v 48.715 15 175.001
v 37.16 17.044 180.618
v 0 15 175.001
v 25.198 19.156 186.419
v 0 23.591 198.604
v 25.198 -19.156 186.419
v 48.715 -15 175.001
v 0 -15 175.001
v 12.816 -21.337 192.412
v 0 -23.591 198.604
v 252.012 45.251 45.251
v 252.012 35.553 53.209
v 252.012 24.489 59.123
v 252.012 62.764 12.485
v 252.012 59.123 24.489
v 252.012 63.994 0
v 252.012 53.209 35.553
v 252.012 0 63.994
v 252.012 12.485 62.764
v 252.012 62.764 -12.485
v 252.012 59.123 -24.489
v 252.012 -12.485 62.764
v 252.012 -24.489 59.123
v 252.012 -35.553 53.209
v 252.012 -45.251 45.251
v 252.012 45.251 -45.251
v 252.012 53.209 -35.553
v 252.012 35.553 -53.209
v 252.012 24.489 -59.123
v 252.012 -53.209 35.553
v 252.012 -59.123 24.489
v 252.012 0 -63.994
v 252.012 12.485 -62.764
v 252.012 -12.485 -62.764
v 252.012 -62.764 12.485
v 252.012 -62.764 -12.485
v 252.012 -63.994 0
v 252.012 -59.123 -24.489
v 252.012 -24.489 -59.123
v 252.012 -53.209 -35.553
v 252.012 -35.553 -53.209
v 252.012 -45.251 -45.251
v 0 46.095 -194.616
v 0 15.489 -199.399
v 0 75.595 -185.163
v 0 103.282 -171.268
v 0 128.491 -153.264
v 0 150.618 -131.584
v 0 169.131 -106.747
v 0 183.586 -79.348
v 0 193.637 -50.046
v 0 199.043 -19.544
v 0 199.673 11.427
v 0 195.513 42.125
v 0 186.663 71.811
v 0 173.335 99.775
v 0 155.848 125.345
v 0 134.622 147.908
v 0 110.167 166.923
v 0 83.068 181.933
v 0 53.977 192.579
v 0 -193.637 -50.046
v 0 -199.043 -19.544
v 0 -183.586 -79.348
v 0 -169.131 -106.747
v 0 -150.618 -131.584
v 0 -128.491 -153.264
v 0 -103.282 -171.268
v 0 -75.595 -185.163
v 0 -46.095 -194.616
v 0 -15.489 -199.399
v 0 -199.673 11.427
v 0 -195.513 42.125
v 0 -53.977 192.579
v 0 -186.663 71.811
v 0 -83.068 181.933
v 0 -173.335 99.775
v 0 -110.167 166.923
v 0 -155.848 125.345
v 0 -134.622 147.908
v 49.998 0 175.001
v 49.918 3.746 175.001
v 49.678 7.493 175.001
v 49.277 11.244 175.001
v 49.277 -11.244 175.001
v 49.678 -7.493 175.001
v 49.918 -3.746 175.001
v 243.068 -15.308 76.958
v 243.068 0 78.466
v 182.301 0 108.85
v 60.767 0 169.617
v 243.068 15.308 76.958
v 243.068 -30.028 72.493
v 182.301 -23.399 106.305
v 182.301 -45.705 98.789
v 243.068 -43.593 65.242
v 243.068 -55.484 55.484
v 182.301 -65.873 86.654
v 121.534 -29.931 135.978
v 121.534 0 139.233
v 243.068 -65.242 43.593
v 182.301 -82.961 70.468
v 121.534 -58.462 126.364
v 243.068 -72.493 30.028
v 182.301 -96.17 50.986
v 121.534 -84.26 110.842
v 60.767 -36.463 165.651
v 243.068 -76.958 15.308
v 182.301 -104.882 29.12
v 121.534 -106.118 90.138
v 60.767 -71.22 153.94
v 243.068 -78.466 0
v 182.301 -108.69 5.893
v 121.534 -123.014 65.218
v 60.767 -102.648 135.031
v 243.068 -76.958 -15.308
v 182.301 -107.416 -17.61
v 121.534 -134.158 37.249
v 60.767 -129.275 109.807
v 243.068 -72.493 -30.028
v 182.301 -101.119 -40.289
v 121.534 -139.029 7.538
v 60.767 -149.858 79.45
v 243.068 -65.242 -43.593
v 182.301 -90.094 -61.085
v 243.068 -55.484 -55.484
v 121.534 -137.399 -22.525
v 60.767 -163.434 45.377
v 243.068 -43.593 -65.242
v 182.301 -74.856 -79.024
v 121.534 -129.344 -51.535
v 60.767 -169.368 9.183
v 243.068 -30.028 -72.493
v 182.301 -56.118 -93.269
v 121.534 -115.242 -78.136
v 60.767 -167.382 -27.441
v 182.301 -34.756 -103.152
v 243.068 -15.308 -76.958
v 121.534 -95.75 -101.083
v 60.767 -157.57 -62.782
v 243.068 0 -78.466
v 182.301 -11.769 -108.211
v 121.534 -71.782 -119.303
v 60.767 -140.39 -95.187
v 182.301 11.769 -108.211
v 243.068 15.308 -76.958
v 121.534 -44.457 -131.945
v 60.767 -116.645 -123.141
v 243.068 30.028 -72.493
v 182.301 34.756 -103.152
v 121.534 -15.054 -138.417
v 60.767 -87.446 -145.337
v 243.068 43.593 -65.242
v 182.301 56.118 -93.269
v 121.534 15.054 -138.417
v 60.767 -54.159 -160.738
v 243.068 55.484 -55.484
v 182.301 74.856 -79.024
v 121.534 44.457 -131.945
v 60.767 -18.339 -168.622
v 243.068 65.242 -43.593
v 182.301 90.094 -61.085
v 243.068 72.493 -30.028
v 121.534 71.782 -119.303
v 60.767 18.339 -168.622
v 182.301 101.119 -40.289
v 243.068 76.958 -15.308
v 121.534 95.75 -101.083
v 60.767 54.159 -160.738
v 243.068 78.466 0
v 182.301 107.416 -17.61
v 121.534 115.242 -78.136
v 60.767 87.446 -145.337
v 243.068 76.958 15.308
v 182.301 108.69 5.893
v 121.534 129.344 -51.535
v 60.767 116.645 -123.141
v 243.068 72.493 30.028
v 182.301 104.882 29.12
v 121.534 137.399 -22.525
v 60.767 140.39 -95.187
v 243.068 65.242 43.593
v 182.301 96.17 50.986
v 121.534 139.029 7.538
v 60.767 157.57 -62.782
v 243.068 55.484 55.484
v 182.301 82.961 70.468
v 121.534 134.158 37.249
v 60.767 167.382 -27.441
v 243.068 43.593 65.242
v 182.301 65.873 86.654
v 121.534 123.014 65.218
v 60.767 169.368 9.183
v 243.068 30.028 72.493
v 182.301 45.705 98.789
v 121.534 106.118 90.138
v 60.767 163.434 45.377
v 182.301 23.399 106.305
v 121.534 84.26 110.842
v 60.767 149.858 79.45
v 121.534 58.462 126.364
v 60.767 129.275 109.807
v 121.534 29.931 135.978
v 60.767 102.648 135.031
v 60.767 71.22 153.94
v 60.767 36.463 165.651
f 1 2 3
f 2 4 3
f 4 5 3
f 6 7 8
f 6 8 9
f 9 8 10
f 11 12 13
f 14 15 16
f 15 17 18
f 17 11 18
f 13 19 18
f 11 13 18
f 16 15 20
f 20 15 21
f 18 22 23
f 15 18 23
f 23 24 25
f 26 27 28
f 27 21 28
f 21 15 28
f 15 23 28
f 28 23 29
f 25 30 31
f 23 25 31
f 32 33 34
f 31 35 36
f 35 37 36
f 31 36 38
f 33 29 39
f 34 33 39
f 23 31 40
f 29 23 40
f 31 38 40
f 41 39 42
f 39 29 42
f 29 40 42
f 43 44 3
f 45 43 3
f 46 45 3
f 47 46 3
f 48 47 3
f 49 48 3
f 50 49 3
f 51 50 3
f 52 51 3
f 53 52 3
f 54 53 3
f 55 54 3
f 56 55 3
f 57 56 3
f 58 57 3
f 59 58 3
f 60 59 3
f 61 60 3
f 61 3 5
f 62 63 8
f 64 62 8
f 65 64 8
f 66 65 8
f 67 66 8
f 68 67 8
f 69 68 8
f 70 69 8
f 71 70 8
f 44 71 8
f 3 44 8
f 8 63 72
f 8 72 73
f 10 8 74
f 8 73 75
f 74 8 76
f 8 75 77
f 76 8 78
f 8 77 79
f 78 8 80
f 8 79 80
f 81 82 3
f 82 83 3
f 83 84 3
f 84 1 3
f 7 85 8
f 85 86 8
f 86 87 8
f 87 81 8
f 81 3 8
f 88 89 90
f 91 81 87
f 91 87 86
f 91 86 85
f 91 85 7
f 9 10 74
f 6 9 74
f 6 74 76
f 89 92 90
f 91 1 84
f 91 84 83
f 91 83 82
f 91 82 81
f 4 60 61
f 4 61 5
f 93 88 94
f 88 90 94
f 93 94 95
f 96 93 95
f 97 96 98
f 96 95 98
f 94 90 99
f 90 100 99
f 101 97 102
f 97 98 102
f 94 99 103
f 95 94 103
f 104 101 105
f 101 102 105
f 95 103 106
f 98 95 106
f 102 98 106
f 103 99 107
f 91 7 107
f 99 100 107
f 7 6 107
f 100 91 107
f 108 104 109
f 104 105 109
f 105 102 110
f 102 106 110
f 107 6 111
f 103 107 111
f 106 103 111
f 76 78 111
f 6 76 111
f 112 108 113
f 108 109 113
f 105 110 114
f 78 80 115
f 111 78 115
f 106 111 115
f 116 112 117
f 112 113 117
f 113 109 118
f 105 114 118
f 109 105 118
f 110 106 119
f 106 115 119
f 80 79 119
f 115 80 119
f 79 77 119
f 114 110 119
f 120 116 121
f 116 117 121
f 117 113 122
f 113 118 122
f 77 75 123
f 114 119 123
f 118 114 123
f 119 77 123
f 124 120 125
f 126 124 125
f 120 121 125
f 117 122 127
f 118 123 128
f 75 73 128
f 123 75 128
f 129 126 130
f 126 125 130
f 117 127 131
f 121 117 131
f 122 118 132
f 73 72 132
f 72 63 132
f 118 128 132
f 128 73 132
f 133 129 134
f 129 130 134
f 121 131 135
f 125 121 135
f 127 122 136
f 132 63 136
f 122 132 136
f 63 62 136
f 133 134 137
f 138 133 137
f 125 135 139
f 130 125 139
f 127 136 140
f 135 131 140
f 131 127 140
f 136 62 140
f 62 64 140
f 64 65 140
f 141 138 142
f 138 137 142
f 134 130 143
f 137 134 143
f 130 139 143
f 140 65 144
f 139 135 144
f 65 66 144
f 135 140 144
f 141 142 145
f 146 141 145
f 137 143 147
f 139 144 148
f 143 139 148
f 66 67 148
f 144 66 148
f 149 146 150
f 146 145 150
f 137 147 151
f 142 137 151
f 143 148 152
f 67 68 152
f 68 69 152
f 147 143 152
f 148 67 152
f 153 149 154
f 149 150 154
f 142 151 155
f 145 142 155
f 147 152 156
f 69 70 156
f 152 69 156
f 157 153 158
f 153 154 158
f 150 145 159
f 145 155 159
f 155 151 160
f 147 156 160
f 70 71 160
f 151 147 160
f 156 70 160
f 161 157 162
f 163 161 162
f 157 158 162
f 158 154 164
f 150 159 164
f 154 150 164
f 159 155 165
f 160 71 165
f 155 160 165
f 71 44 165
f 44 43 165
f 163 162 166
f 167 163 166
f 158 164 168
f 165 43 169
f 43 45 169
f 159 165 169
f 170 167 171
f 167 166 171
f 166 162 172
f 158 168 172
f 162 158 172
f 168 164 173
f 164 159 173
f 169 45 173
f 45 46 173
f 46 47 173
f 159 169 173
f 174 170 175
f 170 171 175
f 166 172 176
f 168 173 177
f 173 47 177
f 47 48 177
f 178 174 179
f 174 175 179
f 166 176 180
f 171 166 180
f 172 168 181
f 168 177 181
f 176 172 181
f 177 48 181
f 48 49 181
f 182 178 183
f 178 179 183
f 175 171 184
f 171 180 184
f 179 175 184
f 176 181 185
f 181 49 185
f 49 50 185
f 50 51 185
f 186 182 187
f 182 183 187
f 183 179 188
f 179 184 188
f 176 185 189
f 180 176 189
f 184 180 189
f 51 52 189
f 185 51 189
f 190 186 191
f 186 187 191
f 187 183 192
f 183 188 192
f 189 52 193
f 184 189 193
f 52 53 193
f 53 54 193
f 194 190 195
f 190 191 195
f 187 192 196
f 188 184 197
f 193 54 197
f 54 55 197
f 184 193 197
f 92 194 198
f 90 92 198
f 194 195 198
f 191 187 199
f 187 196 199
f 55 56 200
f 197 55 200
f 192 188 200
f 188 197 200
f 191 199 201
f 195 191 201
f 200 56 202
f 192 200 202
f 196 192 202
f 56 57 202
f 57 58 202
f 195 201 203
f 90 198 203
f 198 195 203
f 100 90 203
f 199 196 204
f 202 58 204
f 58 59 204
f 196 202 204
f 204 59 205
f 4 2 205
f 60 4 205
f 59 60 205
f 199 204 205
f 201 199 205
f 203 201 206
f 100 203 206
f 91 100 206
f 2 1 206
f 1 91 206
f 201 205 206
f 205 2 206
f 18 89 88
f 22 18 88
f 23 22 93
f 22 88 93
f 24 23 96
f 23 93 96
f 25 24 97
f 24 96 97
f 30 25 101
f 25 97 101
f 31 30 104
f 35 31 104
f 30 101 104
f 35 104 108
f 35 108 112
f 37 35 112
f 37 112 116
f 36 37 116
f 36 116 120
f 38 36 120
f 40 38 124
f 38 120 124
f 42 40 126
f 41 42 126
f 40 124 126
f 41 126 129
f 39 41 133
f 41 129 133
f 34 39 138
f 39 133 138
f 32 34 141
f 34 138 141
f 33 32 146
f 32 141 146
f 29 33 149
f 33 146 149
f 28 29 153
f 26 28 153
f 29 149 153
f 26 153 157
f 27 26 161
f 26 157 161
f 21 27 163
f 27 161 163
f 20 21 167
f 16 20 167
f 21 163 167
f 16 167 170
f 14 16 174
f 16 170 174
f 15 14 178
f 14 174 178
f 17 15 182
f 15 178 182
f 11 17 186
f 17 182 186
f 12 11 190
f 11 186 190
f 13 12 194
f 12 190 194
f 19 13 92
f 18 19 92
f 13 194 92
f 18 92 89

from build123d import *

# Parameters (mm, degrees)
F2_SIZE  = 10
F4_DEPTH = 1000


with BuildPart() as f1:
    # F0 (on Front) → F1 (revolve)
    with BuildSketch(Plane.XZ):
        Polygon((0, 200), (0, 0), (252.01218, 0), (252.01218, 73.99391), align=None)
    revolve(axis=Axis((191.066653, 0, 0), (1, 0, 0)))

    # F2
    f2_edges = [f1.edges().sort_by_distance(p)[0] for p in [
        (252.01218, 0, -73.99391),
    ]]
    chamfer(f2_edges, length=F2_SIZE)

    # F3 (on face) → F4 (cut)
    with BuildSketch(Plane(origin=(0, 0, 0), x_dir=(0, -1, 0), z_dir=(-1, 0, 0))):
        with BuildLine():
            Line((-15, 175.000831), (0, 175.000831))
            Line((0, 175.000831), (15, 175.000831))
            Line((15, 175.000831), (23.590783, 198.603814))
            ThreePointArc((23.590783, 198.603814), (0, 200), (-23.590783, 198.603814))
            Line((-23.590783, 198.603814), (-15, 175.000831))
        make_face()
    extrude(amount=-F4_DEPTH, mode=Mode.SUBTRACT)


solid = f1.part
